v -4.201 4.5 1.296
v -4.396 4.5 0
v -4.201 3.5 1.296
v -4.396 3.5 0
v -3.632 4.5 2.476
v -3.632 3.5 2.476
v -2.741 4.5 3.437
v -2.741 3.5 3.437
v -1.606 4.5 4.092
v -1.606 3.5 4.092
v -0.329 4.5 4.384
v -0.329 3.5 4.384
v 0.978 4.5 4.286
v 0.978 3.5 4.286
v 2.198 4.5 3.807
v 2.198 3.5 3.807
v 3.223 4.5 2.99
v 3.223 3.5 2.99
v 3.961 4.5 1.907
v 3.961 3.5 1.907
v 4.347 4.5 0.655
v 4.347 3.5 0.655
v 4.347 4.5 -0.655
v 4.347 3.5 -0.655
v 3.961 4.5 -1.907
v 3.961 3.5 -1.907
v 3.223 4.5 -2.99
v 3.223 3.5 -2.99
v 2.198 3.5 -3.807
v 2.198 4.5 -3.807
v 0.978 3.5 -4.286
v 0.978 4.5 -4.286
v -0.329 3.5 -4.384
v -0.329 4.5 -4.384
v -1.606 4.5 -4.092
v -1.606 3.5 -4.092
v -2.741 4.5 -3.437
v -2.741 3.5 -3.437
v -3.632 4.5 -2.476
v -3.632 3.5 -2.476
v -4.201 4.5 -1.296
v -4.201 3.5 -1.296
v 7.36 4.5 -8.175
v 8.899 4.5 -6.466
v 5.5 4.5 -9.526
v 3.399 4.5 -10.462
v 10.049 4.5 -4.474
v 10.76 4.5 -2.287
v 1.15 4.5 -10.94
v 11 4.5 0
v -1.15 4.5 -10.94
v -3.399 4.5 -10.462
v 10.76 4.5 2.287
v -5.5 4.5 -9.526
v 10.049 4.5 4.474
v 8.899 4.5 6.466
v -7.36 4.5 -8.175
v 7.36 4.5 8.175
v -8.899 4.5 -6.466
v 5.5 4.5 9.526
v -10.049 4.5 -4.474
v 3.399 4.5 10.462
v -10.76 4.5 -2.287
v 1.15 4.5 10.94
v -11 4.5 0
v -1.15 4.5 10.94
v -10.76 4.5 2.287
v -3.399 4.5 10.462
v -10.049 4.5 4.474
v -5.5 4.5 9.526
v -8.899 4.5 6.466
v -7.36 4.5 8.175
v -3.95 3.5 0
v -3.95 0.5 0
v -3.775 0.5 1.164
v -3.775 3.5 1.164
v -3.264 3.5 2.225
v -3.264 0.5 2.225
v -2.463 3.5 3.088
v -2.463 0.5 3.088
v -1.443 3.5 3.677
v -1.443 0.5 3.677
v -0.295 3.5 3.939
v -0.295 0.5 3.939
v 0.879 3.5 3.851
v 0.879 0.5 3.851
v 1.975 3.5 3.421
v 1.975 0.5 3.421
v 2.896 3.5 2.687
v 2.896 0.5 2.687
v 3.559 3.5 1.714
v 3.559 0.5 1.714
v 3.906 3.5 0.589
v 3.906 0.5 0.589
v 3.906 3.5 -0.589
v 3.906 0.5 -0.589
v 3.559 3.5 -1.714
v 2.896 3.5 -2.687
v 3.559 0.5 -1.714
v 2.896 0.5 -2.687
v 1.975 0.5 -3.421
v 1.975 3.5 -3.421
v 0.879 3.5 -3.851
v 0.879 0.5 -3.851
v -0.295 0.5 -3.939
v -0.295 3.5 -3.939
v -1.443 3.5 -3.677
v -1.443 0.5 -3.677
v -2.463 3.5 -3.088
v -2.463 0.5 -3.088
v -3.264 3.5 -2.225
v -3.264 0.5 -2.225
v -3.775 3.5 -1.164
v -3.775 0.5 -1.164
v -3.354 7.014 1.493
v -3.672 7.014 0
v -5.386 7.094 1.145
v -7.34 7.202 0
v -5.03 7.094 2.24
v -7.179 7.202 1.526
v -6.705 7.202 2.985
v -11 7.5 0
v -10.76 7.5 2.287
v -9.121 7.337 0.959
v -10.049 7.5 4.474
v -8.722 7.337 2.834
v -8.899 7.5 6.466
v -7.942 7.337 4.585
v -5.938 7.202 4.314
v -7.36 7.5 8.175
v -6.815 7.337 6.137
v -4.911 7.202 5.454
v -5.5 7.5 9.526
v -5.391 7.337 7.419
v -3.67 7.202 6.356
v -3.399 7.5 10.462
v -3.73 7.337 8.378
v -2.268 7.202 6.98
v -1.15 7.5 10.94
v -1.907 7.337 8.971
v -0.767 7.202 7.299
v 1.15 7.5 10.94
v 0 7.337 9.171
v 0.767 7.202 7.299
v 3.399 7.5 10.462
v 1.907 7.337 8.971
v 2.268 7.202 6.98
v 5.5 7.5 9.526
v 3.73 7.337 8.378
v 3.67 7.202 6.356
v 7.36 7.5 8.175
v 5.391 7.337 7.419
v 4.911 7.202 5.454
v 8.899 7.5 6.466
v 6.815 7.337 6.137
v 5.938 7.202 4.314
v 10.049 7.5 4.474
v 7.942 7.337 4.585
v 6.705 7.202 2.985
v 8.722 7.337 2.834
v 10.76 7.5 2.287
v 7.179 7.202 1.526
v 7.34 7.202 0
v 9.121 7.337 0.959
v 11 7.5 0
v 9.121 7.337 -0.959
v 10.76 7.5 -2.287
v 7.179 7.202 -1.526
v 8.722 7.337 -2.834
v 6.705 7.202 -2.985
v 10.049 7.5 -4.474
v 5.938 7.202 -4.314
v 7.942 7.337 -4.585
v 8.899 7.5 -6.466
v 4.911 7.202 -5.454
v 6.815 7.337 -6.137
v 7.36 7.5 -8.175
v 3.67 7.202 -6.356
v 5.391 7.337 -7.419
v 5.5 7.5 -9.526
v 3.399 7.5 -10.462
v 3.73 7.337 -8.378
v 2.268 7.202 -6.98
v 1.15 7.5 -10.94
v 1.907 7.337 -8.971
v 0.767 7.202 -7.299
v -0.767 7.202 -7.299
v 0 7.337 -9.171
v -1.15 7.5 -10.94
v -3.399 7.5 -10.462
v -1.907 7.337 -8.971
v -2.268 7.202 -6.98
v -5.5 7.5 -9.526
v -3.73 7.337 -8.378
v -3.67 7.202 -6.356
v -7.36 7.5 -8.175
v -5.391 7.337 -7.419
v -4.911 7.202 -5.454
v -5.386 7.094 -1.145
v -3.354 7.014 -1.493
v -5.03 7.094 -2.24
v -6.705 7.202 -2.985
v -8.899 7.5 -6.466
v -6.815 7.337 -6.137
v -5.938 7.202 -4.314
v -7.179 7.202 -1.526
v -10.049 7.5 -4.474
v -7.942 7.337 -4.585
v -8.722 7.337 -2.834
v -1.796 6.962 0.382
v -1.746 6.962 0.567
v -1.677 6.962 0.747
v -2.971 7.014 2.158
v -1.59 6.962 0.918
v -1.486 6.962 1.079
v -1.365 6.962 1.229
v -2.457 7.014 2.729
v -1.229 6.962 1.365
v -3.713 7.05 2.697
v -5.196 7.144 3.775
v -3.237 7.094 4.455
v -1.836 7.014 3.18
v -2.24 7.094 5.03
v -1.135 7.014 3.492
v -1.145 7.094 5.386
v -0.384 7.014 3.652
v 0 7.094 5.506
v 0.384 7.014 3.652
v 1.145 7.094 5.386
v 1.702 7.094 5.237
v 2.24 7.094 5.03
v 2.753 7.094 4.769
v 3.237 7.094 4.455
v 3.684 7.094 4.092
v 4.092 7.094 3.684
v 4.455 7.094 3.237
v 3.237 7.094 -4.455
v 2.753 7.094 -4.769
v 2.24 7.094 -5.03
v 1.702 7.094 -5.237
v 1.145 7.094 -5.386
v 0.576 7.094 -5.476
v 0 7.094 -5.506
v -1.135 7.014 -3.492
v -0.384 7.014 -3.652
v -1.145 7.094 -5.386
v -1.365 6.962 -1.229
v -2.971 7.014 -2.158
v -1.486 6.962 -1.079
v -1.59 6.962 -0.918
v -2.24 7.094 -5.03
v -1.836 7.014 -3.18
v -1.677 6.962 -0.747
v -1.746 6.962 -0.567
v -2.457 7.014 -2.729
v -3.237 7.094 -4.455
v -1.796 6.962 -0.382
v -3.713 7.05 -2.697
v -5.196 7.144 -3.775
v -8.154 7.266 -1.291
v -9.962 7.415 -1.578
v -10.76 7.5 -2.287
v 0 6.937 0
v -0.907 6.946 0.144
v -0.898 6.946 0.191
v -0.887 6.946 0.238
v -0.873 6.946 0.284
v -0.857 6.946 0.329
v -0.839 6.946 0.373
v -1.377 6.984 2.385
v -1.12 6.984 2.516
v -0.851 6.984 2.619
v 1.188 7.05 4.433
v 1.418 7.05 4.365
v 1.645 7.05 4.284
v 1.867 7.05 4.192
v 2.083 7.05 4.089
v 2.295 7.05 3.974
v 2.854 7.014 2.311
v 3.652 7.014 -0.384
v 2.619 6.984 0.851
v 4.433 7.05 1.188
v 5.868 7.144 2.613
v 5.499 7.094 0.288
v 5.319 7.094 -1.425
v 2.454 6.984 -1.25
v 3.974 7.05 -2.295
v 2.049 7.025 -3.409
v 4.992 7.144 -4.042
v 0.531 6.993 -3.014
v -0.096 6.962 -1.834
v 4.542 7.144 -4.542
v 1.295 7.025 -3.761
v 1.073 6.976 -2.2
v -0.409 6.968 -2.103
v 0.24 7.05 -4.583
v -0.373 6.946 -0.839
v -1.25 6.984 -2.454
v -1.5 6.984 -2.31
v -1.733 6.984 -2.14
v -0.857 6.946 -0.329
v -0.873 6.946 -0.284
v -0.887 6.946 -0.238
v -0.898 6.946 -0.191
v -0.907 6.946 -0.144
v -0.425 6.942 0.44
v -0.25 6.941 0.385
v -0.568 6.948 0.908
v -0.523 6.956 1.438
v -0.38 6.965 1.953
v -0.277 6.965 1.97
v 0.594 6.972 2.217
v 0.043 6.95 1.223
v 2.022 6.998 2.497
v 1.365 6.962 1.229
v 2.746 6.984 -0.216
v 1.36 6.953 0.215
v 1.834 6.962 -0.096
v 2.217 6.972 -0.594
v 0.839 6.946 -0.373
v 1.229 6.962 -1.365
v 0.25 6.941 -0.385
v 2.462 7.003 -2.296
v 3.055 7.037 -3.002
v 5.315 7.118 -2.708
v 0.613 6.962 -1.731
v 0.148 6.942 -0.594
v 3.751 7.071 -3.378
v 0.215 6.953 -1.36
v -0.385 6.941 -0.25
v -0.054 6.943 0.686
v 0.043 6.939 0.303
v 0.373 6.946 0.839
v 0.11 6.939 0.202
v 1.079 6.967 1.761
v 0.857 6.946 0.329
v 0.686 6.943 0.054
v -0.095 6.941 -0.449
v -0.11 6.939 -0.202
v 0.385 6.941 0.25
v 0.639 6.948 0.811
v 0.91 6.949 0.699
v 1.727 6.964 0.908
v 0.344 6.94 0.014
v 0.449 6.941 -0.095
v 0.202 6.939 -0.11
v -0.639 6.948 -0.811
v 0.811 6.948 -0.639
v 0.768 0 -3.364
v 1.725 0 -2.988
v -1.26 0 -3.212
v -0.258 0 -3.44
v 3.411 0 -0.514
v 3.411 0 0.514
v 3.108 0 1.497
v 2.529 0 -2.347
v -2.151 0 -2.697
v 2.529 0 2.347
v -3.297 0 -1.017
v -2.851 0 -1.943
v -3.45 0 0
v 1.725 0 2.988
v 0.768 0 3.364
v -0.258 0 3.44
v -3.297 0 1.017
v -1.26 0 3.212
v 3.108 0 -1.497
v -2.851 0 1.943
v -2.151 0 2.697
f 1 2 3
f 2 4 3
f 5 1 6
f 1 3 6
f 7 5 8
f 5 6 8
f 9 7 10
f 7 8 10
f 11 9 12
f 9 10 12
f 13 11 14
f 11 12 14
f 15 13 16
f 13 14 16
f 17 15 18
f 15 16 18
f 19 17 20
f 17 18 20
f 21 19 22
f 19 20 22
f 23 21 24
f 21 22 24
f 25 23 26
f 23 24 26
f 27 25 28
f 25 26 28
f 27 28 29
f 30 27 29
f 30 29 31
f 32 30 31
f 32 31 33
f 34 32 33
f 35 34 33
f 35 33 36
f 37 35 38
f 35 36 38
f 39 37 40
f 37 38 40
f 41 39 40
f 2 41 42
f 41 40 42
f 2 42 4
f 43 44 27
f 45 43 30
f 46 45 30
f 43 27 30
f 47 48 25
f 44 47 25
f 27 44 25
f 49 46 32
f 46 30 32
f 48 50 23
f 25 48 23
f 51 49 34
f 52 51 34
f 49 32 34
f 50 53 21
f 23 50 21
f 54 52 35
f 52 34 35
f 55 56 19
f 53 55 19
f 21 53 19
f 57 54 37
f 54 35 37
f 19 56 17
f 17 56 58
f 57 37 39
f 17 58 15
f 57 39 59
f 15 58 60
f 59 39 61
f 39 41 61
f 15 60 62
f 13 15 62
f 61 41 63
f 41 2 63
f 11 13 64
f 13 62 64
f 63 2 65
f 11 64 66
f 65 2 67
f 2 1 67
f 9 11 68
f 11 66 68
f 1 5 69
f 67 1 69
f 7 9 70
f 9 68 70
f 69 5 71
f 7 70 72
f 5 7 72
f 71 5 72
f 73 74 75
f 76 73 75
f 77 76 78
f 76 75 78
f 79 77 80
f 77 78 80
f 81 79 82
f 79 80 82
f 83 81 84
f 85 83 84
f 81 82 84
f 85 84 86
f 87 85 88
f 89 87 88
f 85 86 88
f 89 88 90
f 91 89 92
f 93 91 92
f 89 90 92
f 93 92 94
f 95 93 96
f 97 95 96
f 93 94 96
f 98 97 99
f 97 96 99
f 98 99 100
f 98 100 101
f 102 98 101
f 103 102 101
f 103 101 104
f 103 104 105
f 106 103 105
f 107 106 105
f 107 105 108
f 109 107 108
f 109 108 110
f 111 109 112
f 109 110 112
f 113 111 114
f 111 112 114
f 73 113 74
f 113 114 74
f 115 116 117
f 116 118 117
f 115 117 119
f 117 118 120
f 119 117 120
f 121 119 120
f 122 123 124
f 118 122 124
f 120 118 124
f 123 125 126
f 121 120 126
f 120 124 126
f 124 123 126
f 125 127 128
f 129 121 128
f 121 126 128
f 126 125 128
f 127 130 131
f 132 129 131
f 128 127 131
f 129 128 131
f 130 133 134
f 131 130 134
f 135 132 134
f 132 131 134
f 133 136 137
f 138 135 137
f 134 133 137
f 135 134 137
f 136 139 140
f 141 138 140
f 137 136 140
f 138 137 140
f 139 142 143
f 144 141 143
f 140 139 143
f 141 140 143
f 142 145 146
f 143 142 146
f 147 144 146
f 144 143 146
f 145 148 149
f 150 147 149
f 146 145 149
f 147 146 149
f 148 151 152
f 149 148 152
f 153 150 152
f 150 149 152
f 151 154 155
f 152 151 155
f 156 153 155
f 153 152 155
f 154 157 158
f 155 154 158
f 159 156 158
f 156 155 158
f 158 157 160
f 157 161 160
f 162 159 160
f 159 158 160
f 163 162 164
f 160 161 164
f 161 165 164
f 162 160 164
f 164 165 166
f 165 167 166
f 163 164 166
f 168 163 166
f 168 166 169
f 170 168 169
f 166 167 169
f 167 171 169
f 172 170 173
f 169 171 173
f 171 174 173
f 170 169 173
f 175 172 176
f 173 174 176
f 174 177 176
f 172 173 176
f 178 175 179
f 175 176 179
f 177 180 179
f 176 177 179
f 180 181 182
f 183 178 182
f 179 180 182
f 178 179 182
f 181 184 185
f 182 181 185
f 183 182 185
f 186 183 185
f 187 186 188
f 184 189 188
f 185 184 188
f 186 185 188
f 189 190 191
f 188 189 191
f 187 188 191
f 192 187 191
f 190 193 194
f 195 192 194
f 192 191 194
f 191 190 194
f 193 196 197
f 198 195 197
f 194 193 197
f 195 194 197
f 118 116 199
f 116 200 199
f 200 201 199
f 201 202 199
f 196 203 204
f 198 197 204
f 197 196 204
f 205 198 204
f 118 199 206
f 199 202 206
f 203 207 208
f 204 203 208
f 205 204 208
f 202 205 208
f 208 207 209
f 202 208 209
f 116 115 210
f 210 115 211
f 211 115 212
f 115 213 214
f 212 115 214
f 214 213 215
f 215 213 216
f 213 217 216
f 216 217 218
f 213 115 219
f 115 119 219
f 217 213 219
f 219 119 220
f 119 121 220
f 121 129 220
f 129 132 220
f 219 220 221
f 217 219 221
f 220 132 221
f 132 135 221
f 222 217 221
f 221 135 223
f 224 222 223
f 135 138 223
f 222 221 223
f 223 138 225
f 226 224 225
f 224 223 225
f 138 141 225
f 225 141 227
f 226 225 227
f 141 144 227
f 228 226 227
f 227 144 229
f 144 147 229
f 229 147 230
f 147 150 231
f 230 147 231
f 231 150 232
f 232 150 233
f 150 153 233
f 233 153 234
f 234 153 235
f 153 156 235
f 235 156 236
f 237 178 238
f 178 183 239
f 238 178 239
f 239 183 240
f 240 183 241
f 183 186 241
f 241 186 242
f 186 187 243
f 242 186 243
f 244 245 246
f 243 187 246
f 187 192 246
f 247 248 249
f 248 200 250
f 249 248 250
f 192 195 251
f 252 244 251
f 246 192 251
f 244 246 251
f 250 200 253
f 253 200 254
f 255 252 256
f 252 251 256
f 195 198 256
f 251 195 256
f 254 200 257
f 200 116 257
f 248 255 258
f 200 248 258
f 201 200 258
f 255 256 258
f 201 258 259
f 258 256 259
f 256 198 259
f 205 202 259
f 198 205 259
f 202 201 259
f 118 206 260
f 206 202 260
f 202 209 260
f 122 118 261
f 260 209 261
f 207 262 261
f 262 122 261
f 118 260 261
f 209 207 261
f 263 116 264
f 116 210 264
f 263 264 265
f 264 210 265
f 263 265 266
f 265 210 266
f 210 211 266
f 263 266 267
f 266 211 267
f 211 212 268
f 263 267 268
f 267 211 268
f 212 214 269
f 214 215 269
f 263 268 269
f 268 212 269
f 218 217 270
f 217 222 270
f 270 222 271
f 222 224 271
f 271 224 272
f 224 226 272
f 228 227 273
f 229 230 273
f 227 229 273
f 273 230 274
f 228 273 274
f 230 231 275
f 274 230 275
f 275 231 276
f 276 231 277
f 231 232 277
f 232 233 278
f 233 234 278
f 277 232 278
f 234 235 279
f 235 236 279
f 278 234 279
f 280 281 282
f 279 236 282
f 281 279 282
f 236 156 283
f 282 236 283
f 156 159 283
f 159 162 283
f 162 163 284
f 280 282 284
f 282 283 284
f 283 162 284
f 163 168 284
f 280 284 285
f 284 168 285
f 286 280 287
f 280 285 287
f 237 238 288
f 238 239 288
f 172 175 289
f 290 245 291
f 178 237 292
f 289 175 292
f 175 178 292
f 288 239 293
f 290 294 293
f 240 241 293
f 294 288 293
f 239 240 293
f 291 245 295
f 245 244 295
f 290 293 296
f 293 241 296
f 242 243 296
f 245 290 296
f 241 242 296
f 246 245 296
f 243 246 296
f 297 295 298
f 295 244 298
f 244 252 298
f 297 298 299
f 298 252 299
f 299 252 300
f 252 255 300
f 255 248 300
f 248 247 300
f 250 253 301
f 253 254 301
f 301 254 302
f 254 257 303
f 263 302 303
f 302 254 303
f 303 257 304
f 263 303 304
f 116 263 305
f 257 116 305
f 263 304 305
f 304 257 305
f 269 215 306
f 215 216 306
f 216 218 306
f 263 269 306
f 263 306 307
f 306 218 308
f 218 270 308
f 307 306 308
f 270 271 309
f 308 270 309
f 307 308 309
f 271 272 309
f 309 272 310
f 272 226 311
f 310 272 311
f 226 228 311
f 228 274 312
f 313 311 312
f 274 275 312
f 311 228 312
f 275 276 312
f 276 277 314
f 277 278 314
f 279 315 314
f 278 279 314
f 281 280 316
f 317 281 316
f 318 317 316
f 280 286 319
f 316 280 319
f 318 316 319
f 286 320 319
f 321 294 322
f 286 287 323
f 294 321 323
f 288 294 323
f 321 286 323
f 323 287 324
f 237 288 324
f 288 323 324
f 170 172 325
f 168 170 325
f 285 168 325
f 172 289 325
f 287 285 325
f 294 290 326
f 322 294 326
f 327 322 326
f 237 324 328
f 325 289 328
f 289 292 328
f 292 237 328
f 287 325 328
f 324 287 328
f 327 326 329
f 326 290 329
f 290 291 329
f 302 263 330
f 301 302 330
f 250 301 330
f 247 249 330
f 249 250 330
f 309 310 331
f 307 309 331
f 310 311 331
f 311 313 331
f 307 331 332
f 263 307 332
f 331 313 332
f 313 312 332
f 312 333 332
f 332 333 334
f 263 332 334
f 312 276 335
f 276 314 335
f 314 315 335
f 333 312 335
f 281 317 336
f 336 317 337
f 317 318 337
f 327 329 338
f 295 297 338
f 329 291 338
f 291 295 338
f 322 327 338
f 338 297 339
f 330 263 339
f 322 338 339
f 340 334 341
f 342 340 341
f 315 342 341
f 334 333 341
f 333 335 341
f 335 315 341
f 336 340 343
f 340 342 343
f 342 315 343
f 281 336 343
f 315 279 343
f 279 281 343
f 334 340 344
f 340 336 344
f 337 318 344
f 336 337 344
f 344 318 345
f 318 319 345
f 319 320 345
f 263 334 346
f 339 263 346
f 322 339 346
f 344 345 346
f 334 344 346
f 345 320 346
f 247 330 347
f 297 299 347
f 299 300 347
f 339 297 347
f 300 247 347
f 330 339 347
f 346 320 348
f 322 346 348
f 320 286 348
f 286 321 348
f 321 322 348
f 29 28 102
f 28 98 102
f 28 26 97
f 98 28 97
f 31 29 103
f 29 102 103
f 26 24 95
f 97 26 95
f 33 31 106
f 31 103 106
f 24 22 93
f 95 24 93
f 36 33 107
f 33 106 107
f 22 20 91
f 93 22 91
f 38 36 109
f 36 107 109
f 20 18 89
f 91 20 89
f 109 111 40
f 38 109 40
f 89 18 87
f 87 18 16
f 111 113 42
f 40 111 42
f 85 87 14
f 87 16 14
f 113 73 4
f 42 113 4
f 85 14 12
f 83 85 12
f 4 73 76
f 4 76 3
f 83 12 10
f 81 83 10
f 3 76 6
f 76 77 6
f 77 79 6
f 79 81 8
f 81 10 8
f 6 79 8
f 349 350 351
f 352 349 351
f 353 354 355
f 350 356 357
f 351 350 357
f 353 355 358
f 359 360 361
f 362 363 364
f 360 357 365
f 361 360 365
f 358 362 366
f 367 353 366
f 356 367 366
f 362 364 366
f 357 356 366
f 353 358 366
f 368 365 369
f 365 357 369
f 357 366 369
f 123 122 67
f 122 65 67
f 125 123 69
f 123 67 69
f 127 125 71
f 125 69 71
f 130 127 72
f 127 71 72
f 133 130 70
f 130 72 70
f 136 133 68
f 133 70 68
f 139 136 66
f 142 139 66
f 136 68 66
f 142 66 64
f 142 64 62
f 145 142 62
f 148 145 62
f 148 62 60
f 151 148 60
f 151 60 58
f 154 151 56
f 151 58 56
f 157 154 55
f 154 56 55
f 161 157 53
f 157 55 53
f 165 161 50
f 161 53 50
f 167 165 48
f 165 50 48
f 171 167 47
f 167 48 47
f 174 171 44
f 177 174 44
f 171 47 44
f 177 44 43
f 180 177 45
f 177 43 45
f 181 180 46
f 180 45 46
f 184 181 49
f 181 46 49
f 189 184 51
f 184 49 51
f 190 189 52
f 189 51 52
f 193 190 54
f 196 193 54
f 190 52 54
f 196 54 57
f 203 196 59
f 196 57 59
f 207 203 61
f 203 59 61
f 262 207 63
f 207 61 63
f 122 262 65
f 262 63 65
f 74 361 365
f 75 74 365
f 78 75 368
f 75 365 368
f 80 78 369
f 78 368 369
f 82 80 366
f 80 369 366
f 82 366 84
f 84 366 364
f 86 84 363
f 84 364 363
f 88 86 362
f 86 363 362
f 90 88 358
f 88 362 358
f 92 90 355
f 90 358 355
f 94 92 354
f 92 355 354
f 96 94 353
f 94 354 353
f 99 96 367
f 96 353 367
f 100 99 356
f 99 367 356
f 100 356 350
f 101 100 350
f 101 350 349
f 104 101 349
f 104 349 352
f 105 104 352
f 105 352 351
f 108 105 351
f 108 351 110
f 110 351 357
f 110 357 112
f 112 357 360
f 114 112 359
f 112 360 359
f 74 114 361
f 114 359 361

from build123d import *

# Parameters (mm, degrees)
F2_SIZE = 0.5


with BuildPart() as f1:
    # F0 (on Top) → F1 (revolve)
    with BuildSketch(Plane.XY):
        with BuildLine():
            ThreePointArc((0, 6.937257), (-5.506382, 7.093876), (-11, 7.5))
            Line((-11, 7.5), (-11, 4.5))
            Line((-11, 4.5), (-4.396255, 4.5))
            Line((-4.396255, 4.5), (-4.396255, 3.5))
            Line((-4.396255, 3.5), (-3.95, 3.5))
            Line((-3.95, 3.5), (-3.95, 0))
            Line((-3.95, 0), (0, 0))
            Line((0, 0), (0, 6.937257))
        make_face()
    revolve(axis=Axis((0, 3.75, 0), (0, 1, 0)))

    # F2
    f2_edges = [f1.edges().sort_by_distance(p)[0] for p in [
        (3.95, 0, 0),
    ]]
    chamfer(f2_edges, length=F2_SIZE)


solid = f1.part
